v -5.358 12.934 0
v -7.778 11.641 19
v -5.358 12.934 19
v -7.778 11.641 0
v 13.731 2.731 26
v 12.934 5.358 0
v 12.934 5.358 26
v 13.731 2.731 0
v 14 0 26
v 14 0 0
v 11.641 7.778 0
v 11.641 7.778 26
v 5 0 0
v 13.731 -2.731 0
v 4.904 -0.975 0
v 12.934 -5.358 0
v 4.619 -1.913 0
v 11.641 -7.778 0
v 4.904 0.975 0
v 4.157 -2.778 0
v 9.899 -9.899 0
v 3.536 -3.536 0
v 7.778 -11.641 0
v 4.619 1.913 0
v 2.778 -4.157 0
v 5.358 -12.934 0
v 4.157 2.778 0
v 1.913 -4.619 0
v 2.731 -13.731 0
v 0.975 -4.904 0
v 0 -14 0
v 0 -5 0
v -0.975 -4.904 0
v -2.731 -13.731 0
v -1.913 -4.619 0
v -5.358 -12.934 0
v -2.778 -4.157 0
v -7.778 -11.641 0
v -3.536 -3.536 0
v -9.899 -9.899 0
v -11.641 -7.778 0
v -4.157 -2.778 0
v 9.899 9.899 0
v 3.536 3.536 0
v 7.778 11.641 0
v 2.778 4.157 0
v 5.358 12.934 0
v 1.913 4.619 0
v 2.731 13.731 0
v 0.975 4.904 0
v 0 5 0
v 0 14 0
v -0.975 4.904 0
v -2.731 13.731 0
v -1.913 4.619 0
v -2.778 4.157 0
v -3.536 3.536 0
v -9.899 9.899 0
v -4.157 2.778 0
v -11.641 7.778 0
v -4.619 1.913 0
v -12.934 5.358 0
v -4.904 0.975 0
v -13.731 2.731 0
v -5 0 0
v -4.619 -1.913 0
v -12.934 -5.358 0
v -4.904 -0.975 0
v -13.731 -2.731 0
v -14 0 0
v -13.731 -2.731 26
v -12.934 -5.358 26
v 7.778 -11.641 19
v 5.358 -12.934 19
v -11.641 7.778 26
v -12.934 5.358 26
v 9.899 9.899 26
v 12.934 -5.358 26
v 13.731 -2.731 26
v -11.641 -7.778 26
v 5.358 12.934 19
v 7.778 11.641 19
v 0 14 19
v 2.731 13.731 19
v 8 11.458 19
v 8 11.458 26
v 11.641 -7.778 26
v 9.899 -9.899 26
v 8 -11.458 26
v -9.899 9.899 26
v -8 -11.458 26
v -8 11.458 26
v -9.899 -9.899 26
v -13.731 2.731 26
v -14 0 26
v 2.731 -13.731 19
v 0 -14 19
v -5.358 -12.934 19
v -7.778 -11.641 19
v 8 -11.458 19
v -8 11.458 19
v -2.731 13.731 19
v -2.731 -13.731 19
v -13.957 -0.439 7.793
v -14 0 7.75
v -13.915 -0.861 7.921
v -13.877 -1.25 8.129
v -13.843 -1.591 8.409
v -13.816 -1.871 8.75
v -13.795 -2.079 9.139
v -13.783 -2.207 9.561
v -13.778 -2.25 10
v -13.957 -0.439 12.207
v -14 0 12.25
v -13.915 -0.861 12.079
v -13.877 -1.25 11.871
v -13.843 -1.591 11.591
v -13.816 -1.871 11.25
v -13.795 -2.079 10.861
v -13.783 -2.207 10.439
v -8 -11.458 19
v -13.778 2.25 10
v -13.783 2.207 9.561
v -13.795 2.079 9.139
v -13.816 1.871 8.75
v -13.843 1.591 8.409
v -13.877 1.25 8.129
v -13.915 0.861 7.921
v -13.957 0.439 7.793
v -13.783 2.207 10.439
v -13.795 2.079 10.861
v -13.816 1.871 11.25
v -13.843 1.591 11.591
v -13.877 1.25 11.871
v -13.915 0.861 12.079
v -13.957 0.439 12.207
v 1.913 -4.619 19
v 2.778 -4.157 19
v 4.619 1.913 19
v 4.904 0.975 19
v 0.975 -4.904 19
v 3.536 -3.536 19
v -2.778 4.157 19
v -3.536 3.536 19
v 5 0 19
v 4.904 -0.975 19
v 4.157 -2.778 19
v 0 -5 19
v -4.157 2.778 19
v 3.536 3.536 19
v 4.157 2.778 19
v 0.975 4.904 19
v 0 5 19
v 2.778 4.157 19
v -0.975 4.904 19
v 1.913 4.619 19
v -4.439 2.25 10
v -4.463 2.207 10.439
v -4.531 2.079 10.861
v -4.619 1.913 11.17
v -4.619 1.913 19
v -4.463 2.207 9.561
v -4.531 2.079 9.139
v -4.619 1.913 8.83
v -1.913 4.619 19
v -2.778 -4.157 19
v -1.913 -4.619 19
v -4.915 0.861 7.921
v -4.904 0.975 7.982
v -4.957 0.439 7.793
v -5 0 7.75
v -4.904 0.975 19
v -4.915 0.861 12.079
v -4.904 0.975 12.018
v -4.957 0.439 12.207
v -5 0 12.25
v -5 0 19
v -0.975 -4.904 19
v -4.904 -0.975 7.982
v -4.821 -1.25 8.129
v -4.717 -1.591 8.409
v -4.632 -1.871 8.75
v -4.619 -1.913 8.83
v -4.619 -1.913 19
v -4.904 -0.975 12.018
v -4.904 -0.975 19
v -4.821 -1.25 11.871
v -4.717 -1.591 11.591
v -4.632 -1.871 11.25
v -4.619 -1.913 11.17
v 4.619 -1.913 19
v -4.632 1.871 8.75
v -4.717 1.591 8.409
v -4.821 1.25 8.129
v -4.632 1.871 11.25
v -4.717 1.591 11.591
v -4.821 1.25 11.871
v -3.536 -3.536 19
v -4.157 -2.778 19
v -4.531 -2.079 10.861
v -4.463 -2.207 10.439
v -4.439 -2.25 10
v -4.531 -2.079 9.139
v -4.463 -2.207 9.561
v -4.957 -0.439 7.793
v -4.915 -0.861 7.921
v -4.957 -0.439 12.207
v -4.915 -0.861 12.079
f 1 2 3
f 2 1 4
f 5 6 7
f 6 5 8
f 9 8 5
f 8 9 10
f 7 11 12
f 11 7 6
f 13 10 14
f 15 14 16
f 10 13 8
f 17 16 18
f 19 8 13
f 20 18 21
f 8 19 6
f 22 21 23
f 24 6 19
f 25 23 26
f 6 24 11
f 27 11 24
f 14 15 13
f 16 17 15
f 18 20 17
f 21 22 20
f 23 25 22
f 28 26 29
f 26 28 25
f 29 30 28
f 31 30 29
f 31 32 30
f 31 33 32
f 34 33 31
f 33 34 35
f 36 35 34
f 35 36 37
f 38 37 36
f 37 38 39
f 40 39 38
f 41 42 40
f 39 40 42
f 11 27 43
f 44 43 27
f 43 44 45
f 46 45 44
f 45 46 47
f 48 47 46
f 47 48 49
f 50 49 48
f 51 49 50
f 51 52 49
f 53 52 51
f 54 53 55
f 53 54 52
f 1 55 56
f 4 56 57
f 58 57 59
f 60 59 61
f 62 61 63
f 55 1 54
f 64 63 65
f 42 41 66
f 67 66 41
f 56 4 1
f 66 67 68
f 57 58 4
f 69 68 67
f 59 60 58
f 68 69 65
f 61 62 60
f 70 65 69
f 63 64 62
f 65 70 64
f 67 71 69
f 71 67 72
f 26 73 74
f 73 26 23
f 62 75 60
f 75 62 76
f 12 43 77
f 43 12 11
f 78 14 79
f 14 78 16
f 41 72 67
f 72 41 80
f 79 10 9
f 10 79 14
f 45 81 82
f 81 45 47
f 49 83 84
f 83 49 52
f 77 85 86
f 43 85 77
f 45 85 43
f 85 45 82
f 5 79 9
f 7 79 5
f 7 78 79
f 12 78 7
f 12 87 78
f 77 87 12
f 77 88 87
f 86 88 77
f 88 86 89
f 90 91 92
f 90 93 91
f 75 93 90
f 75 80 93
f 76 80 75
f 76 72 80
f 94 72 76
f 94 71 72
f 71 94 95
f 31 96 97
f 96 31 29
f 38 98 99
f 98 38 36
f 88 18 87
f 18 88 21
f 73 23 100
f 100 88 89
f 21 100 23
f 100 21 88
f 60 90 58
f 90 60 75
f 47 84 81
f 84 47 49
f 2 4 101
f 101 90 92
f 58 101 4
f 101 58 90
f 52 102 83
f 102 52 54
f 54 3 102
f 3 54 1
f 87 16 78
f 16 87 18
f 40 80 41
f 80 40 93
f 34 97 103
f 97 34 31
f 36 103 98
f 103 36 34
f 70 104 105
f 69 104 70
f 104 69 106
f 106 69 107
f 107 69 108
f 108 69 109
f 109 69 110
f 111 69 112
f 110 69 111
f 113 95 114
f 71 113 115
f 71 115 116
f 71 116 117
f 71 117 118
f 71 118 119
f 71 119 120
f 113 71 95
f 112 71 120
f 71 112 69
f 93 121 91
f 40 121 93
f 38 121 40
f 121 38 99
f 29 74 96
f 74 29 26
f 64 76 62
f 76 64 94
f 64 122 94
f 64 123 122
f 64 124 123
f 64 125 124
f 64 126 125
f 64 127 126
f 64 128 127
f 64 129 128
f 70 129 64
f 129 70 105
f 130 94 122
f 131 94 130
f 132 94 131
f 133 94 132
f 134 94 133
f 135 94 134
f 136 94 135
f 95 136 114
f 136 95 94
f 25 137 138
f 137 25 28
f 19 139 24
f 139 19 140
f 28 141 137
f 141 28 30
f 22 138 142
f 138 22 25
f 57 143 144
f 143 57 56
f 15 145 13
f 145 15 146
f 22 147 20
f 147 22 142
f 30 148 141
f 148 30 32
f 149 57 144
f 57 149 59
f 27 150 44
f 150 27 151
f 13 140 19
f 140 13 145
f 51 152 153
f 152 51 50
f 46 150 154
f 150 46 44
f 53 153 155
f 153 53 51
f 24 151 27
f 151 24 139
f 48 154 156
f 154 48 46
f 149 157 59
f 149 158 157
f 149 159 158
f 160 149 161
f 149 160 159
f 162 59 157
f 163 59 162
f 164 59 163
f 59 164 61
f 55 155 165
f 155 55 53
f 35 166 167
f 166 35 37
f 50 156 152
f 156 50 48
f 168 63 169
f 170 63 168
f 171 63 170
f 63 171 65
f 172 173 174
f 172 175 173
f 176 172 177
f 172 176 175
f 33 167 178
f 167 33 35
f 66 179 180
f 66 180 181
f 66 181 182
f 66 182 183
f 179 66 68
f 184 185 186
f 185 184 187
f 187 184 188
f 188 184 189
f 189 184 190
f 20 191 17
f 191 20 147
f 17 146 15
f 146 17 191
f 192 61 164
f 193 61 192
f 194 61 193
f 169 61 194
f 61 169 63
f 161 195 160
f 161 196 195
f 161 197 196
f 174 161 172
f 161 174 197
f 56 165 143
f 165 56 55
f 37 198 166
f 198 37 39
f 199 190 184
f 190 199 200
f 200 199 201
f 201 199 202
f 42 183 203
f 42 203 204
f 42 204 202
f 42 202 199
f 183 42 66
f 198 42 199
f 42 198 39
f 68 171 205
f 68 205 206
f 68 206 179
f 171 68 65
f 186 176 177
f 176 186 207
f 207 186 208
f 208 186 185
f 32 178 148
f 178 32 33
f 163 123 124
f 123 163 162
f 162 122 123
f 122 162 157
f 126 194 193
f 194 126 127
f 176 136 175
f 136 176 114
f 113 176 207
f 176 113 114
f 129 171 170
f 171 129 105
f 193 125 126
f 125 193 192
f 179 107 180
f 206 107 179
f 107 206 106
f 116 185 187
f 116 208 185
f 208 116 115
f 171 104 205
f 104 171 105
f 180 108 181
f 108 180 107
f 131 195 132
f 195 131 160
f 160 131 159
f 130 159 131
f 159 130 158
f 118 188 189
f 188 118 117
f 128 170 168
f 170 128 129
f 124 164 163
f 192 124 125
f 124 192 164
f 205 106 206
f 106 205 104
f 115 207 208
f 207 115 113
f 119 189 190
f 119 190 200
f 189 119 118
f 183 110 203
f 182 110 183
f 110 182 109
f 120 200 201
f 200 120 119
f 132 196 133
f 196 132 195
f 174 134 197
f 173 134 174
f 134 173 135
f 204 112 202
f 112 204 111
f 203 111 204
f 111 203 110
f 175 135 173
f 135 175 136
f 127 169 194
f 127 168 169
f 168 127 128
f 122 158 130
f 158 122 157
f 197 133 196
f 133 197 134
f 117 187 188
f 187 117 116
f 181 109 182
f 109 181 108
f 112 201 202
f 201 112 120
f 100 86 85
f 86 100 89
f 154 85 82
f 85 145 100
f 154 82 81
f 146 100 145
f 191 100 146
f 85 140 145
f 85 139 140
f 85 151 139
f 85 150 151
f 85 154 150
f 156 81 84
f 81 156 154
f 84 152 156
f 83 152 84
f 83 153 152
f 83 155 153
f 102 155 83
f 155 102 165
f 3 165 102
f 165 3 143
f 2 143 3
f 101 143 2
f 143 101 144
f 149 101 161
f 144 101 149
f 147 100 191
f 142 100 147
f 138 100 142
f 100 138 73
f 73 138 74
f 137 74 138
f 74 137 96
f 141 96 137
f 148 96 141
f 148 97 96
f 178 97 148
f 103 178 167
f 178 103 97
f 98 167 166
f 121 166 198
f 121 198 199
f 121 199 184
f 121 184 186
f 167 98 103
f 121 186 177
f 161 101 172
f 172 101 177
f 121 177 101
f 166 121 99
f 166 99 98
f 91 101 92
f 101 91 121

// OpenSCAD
$fn = 32;

// ----------------------------------------------------------------------
// Oldham coupling hub: 28 x 26 mm
// ----------------------------------------------------------------------

// --- parameters (mm) ---
flange_dia = 28;          // hub diameter
flange_len = 20;          // hub length
hub_bore = 10;            // shaft bore
key_w = 16;               // drive tongue width
tongue_h = 6;             // drive tongue height
set_d = 4.5;              // set screw tap hole

module hub() {
  /* the slot side is a raised disc with a groove milled across it */
  cylinder(h = flange_len + tongue_h, d = flange_dia);
}

difference() {
  hub();
  translate([0, 0, -1]) cylinder(h = flange_len + tongue_h + 2, d = hub_bore);
  translate([-flange_dia / 2 - 1, 0, flange_len * 0.5])
    rotate([0, 90, 0]) cylinder(h = flange_dia / 2 + 2, d = set_d);
  translate([-key_w / 2, -flange_dia / 2 - 1, flange_len - 1])
    cube([key_w, flange_dia + 2, tongue_h + 1]);
}
